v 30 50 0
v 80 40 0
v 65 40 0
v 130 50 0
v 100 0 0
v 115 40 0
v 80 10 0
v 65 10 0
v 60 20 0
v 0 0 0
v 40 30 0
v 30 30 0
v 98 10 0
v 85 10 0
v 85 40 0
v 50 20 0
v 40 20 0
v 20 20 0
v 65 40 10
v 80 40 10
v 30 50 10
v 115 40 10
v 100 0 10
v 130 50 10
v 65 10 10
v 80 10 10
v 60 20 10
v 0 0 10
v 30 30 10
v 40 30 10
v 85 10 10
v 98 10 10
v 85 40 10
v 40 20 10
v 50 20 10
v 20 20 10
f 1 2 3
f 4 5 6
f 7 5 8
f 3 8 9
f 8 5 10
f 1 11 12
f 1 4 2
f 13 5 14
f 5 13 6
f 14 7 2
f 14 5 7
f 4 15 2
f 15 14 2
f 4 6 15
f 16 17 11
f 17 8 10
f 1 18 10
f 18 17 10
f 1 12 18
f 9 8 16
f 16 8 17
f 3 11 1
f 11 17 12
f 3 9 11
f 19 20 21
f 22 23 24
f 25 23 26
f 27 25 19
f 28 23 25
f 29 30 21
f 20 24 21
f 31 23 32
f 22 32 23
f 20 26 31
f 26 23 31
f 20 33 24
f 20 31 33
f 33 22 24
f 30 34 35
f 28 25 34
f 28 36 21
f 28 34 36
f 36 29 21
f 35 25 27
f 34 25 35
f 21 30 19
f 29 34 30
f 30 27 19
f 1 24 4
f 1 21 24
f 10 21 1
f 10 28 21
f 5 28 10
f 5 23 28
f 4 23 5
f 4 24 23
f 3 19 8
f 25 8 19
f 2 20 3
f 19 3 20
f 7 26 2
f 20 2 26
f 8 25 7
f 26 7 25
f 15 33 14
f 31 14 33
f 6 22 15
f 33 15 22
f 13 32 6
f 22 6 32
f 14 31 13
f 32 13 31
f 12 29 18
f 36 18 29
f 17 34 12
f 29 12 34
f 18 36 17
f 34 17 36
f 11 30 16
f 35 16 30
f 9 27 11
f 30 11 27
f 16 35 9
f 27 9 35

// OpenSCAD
//control de la camara
$vpr = [55.0, 0, 25.0];   // Rotación de la cámara
$vpt = [70, 0, 0];   // Traslación de la cámara
$vpf = 22.5;           // Factor de perspectiva
$vpd = 300;           // Distancia de la cámara

// Ejemplo de objeto
//cube([20, 10, 10]);

      //example polygon with multiple holes
a0 = [[0,0],[100,0],[130,50],[30,50]];     // main
b0 = [1,0,3,2];
a1 = [[20,20],[40,20],[30,30]];            // hole 1
b1 = [4,5,6];
a2 = [[50,20],[60,20],[40,30]];            // hole 2
b2 = [7,8,9];
a3 = [[65,10],[80,10],[80,40],[65,40]];    // hole 3
b3 = [10,11,12,13];
a4 = [[98,10],[115,40],[85,40],[85,10]];   // hole 4
b4 = [14,15,16,17];
a  = concat (a0,a1,a2,a3,a4);
b  = [b0,b1,b2,b3,b4];
//polygon(a,b);
      //alternate 
linear_extrude(height=10)
rotate([0,0,0]){
   polygon(a,[b0,b1,b2,b3,b4]);
   }
